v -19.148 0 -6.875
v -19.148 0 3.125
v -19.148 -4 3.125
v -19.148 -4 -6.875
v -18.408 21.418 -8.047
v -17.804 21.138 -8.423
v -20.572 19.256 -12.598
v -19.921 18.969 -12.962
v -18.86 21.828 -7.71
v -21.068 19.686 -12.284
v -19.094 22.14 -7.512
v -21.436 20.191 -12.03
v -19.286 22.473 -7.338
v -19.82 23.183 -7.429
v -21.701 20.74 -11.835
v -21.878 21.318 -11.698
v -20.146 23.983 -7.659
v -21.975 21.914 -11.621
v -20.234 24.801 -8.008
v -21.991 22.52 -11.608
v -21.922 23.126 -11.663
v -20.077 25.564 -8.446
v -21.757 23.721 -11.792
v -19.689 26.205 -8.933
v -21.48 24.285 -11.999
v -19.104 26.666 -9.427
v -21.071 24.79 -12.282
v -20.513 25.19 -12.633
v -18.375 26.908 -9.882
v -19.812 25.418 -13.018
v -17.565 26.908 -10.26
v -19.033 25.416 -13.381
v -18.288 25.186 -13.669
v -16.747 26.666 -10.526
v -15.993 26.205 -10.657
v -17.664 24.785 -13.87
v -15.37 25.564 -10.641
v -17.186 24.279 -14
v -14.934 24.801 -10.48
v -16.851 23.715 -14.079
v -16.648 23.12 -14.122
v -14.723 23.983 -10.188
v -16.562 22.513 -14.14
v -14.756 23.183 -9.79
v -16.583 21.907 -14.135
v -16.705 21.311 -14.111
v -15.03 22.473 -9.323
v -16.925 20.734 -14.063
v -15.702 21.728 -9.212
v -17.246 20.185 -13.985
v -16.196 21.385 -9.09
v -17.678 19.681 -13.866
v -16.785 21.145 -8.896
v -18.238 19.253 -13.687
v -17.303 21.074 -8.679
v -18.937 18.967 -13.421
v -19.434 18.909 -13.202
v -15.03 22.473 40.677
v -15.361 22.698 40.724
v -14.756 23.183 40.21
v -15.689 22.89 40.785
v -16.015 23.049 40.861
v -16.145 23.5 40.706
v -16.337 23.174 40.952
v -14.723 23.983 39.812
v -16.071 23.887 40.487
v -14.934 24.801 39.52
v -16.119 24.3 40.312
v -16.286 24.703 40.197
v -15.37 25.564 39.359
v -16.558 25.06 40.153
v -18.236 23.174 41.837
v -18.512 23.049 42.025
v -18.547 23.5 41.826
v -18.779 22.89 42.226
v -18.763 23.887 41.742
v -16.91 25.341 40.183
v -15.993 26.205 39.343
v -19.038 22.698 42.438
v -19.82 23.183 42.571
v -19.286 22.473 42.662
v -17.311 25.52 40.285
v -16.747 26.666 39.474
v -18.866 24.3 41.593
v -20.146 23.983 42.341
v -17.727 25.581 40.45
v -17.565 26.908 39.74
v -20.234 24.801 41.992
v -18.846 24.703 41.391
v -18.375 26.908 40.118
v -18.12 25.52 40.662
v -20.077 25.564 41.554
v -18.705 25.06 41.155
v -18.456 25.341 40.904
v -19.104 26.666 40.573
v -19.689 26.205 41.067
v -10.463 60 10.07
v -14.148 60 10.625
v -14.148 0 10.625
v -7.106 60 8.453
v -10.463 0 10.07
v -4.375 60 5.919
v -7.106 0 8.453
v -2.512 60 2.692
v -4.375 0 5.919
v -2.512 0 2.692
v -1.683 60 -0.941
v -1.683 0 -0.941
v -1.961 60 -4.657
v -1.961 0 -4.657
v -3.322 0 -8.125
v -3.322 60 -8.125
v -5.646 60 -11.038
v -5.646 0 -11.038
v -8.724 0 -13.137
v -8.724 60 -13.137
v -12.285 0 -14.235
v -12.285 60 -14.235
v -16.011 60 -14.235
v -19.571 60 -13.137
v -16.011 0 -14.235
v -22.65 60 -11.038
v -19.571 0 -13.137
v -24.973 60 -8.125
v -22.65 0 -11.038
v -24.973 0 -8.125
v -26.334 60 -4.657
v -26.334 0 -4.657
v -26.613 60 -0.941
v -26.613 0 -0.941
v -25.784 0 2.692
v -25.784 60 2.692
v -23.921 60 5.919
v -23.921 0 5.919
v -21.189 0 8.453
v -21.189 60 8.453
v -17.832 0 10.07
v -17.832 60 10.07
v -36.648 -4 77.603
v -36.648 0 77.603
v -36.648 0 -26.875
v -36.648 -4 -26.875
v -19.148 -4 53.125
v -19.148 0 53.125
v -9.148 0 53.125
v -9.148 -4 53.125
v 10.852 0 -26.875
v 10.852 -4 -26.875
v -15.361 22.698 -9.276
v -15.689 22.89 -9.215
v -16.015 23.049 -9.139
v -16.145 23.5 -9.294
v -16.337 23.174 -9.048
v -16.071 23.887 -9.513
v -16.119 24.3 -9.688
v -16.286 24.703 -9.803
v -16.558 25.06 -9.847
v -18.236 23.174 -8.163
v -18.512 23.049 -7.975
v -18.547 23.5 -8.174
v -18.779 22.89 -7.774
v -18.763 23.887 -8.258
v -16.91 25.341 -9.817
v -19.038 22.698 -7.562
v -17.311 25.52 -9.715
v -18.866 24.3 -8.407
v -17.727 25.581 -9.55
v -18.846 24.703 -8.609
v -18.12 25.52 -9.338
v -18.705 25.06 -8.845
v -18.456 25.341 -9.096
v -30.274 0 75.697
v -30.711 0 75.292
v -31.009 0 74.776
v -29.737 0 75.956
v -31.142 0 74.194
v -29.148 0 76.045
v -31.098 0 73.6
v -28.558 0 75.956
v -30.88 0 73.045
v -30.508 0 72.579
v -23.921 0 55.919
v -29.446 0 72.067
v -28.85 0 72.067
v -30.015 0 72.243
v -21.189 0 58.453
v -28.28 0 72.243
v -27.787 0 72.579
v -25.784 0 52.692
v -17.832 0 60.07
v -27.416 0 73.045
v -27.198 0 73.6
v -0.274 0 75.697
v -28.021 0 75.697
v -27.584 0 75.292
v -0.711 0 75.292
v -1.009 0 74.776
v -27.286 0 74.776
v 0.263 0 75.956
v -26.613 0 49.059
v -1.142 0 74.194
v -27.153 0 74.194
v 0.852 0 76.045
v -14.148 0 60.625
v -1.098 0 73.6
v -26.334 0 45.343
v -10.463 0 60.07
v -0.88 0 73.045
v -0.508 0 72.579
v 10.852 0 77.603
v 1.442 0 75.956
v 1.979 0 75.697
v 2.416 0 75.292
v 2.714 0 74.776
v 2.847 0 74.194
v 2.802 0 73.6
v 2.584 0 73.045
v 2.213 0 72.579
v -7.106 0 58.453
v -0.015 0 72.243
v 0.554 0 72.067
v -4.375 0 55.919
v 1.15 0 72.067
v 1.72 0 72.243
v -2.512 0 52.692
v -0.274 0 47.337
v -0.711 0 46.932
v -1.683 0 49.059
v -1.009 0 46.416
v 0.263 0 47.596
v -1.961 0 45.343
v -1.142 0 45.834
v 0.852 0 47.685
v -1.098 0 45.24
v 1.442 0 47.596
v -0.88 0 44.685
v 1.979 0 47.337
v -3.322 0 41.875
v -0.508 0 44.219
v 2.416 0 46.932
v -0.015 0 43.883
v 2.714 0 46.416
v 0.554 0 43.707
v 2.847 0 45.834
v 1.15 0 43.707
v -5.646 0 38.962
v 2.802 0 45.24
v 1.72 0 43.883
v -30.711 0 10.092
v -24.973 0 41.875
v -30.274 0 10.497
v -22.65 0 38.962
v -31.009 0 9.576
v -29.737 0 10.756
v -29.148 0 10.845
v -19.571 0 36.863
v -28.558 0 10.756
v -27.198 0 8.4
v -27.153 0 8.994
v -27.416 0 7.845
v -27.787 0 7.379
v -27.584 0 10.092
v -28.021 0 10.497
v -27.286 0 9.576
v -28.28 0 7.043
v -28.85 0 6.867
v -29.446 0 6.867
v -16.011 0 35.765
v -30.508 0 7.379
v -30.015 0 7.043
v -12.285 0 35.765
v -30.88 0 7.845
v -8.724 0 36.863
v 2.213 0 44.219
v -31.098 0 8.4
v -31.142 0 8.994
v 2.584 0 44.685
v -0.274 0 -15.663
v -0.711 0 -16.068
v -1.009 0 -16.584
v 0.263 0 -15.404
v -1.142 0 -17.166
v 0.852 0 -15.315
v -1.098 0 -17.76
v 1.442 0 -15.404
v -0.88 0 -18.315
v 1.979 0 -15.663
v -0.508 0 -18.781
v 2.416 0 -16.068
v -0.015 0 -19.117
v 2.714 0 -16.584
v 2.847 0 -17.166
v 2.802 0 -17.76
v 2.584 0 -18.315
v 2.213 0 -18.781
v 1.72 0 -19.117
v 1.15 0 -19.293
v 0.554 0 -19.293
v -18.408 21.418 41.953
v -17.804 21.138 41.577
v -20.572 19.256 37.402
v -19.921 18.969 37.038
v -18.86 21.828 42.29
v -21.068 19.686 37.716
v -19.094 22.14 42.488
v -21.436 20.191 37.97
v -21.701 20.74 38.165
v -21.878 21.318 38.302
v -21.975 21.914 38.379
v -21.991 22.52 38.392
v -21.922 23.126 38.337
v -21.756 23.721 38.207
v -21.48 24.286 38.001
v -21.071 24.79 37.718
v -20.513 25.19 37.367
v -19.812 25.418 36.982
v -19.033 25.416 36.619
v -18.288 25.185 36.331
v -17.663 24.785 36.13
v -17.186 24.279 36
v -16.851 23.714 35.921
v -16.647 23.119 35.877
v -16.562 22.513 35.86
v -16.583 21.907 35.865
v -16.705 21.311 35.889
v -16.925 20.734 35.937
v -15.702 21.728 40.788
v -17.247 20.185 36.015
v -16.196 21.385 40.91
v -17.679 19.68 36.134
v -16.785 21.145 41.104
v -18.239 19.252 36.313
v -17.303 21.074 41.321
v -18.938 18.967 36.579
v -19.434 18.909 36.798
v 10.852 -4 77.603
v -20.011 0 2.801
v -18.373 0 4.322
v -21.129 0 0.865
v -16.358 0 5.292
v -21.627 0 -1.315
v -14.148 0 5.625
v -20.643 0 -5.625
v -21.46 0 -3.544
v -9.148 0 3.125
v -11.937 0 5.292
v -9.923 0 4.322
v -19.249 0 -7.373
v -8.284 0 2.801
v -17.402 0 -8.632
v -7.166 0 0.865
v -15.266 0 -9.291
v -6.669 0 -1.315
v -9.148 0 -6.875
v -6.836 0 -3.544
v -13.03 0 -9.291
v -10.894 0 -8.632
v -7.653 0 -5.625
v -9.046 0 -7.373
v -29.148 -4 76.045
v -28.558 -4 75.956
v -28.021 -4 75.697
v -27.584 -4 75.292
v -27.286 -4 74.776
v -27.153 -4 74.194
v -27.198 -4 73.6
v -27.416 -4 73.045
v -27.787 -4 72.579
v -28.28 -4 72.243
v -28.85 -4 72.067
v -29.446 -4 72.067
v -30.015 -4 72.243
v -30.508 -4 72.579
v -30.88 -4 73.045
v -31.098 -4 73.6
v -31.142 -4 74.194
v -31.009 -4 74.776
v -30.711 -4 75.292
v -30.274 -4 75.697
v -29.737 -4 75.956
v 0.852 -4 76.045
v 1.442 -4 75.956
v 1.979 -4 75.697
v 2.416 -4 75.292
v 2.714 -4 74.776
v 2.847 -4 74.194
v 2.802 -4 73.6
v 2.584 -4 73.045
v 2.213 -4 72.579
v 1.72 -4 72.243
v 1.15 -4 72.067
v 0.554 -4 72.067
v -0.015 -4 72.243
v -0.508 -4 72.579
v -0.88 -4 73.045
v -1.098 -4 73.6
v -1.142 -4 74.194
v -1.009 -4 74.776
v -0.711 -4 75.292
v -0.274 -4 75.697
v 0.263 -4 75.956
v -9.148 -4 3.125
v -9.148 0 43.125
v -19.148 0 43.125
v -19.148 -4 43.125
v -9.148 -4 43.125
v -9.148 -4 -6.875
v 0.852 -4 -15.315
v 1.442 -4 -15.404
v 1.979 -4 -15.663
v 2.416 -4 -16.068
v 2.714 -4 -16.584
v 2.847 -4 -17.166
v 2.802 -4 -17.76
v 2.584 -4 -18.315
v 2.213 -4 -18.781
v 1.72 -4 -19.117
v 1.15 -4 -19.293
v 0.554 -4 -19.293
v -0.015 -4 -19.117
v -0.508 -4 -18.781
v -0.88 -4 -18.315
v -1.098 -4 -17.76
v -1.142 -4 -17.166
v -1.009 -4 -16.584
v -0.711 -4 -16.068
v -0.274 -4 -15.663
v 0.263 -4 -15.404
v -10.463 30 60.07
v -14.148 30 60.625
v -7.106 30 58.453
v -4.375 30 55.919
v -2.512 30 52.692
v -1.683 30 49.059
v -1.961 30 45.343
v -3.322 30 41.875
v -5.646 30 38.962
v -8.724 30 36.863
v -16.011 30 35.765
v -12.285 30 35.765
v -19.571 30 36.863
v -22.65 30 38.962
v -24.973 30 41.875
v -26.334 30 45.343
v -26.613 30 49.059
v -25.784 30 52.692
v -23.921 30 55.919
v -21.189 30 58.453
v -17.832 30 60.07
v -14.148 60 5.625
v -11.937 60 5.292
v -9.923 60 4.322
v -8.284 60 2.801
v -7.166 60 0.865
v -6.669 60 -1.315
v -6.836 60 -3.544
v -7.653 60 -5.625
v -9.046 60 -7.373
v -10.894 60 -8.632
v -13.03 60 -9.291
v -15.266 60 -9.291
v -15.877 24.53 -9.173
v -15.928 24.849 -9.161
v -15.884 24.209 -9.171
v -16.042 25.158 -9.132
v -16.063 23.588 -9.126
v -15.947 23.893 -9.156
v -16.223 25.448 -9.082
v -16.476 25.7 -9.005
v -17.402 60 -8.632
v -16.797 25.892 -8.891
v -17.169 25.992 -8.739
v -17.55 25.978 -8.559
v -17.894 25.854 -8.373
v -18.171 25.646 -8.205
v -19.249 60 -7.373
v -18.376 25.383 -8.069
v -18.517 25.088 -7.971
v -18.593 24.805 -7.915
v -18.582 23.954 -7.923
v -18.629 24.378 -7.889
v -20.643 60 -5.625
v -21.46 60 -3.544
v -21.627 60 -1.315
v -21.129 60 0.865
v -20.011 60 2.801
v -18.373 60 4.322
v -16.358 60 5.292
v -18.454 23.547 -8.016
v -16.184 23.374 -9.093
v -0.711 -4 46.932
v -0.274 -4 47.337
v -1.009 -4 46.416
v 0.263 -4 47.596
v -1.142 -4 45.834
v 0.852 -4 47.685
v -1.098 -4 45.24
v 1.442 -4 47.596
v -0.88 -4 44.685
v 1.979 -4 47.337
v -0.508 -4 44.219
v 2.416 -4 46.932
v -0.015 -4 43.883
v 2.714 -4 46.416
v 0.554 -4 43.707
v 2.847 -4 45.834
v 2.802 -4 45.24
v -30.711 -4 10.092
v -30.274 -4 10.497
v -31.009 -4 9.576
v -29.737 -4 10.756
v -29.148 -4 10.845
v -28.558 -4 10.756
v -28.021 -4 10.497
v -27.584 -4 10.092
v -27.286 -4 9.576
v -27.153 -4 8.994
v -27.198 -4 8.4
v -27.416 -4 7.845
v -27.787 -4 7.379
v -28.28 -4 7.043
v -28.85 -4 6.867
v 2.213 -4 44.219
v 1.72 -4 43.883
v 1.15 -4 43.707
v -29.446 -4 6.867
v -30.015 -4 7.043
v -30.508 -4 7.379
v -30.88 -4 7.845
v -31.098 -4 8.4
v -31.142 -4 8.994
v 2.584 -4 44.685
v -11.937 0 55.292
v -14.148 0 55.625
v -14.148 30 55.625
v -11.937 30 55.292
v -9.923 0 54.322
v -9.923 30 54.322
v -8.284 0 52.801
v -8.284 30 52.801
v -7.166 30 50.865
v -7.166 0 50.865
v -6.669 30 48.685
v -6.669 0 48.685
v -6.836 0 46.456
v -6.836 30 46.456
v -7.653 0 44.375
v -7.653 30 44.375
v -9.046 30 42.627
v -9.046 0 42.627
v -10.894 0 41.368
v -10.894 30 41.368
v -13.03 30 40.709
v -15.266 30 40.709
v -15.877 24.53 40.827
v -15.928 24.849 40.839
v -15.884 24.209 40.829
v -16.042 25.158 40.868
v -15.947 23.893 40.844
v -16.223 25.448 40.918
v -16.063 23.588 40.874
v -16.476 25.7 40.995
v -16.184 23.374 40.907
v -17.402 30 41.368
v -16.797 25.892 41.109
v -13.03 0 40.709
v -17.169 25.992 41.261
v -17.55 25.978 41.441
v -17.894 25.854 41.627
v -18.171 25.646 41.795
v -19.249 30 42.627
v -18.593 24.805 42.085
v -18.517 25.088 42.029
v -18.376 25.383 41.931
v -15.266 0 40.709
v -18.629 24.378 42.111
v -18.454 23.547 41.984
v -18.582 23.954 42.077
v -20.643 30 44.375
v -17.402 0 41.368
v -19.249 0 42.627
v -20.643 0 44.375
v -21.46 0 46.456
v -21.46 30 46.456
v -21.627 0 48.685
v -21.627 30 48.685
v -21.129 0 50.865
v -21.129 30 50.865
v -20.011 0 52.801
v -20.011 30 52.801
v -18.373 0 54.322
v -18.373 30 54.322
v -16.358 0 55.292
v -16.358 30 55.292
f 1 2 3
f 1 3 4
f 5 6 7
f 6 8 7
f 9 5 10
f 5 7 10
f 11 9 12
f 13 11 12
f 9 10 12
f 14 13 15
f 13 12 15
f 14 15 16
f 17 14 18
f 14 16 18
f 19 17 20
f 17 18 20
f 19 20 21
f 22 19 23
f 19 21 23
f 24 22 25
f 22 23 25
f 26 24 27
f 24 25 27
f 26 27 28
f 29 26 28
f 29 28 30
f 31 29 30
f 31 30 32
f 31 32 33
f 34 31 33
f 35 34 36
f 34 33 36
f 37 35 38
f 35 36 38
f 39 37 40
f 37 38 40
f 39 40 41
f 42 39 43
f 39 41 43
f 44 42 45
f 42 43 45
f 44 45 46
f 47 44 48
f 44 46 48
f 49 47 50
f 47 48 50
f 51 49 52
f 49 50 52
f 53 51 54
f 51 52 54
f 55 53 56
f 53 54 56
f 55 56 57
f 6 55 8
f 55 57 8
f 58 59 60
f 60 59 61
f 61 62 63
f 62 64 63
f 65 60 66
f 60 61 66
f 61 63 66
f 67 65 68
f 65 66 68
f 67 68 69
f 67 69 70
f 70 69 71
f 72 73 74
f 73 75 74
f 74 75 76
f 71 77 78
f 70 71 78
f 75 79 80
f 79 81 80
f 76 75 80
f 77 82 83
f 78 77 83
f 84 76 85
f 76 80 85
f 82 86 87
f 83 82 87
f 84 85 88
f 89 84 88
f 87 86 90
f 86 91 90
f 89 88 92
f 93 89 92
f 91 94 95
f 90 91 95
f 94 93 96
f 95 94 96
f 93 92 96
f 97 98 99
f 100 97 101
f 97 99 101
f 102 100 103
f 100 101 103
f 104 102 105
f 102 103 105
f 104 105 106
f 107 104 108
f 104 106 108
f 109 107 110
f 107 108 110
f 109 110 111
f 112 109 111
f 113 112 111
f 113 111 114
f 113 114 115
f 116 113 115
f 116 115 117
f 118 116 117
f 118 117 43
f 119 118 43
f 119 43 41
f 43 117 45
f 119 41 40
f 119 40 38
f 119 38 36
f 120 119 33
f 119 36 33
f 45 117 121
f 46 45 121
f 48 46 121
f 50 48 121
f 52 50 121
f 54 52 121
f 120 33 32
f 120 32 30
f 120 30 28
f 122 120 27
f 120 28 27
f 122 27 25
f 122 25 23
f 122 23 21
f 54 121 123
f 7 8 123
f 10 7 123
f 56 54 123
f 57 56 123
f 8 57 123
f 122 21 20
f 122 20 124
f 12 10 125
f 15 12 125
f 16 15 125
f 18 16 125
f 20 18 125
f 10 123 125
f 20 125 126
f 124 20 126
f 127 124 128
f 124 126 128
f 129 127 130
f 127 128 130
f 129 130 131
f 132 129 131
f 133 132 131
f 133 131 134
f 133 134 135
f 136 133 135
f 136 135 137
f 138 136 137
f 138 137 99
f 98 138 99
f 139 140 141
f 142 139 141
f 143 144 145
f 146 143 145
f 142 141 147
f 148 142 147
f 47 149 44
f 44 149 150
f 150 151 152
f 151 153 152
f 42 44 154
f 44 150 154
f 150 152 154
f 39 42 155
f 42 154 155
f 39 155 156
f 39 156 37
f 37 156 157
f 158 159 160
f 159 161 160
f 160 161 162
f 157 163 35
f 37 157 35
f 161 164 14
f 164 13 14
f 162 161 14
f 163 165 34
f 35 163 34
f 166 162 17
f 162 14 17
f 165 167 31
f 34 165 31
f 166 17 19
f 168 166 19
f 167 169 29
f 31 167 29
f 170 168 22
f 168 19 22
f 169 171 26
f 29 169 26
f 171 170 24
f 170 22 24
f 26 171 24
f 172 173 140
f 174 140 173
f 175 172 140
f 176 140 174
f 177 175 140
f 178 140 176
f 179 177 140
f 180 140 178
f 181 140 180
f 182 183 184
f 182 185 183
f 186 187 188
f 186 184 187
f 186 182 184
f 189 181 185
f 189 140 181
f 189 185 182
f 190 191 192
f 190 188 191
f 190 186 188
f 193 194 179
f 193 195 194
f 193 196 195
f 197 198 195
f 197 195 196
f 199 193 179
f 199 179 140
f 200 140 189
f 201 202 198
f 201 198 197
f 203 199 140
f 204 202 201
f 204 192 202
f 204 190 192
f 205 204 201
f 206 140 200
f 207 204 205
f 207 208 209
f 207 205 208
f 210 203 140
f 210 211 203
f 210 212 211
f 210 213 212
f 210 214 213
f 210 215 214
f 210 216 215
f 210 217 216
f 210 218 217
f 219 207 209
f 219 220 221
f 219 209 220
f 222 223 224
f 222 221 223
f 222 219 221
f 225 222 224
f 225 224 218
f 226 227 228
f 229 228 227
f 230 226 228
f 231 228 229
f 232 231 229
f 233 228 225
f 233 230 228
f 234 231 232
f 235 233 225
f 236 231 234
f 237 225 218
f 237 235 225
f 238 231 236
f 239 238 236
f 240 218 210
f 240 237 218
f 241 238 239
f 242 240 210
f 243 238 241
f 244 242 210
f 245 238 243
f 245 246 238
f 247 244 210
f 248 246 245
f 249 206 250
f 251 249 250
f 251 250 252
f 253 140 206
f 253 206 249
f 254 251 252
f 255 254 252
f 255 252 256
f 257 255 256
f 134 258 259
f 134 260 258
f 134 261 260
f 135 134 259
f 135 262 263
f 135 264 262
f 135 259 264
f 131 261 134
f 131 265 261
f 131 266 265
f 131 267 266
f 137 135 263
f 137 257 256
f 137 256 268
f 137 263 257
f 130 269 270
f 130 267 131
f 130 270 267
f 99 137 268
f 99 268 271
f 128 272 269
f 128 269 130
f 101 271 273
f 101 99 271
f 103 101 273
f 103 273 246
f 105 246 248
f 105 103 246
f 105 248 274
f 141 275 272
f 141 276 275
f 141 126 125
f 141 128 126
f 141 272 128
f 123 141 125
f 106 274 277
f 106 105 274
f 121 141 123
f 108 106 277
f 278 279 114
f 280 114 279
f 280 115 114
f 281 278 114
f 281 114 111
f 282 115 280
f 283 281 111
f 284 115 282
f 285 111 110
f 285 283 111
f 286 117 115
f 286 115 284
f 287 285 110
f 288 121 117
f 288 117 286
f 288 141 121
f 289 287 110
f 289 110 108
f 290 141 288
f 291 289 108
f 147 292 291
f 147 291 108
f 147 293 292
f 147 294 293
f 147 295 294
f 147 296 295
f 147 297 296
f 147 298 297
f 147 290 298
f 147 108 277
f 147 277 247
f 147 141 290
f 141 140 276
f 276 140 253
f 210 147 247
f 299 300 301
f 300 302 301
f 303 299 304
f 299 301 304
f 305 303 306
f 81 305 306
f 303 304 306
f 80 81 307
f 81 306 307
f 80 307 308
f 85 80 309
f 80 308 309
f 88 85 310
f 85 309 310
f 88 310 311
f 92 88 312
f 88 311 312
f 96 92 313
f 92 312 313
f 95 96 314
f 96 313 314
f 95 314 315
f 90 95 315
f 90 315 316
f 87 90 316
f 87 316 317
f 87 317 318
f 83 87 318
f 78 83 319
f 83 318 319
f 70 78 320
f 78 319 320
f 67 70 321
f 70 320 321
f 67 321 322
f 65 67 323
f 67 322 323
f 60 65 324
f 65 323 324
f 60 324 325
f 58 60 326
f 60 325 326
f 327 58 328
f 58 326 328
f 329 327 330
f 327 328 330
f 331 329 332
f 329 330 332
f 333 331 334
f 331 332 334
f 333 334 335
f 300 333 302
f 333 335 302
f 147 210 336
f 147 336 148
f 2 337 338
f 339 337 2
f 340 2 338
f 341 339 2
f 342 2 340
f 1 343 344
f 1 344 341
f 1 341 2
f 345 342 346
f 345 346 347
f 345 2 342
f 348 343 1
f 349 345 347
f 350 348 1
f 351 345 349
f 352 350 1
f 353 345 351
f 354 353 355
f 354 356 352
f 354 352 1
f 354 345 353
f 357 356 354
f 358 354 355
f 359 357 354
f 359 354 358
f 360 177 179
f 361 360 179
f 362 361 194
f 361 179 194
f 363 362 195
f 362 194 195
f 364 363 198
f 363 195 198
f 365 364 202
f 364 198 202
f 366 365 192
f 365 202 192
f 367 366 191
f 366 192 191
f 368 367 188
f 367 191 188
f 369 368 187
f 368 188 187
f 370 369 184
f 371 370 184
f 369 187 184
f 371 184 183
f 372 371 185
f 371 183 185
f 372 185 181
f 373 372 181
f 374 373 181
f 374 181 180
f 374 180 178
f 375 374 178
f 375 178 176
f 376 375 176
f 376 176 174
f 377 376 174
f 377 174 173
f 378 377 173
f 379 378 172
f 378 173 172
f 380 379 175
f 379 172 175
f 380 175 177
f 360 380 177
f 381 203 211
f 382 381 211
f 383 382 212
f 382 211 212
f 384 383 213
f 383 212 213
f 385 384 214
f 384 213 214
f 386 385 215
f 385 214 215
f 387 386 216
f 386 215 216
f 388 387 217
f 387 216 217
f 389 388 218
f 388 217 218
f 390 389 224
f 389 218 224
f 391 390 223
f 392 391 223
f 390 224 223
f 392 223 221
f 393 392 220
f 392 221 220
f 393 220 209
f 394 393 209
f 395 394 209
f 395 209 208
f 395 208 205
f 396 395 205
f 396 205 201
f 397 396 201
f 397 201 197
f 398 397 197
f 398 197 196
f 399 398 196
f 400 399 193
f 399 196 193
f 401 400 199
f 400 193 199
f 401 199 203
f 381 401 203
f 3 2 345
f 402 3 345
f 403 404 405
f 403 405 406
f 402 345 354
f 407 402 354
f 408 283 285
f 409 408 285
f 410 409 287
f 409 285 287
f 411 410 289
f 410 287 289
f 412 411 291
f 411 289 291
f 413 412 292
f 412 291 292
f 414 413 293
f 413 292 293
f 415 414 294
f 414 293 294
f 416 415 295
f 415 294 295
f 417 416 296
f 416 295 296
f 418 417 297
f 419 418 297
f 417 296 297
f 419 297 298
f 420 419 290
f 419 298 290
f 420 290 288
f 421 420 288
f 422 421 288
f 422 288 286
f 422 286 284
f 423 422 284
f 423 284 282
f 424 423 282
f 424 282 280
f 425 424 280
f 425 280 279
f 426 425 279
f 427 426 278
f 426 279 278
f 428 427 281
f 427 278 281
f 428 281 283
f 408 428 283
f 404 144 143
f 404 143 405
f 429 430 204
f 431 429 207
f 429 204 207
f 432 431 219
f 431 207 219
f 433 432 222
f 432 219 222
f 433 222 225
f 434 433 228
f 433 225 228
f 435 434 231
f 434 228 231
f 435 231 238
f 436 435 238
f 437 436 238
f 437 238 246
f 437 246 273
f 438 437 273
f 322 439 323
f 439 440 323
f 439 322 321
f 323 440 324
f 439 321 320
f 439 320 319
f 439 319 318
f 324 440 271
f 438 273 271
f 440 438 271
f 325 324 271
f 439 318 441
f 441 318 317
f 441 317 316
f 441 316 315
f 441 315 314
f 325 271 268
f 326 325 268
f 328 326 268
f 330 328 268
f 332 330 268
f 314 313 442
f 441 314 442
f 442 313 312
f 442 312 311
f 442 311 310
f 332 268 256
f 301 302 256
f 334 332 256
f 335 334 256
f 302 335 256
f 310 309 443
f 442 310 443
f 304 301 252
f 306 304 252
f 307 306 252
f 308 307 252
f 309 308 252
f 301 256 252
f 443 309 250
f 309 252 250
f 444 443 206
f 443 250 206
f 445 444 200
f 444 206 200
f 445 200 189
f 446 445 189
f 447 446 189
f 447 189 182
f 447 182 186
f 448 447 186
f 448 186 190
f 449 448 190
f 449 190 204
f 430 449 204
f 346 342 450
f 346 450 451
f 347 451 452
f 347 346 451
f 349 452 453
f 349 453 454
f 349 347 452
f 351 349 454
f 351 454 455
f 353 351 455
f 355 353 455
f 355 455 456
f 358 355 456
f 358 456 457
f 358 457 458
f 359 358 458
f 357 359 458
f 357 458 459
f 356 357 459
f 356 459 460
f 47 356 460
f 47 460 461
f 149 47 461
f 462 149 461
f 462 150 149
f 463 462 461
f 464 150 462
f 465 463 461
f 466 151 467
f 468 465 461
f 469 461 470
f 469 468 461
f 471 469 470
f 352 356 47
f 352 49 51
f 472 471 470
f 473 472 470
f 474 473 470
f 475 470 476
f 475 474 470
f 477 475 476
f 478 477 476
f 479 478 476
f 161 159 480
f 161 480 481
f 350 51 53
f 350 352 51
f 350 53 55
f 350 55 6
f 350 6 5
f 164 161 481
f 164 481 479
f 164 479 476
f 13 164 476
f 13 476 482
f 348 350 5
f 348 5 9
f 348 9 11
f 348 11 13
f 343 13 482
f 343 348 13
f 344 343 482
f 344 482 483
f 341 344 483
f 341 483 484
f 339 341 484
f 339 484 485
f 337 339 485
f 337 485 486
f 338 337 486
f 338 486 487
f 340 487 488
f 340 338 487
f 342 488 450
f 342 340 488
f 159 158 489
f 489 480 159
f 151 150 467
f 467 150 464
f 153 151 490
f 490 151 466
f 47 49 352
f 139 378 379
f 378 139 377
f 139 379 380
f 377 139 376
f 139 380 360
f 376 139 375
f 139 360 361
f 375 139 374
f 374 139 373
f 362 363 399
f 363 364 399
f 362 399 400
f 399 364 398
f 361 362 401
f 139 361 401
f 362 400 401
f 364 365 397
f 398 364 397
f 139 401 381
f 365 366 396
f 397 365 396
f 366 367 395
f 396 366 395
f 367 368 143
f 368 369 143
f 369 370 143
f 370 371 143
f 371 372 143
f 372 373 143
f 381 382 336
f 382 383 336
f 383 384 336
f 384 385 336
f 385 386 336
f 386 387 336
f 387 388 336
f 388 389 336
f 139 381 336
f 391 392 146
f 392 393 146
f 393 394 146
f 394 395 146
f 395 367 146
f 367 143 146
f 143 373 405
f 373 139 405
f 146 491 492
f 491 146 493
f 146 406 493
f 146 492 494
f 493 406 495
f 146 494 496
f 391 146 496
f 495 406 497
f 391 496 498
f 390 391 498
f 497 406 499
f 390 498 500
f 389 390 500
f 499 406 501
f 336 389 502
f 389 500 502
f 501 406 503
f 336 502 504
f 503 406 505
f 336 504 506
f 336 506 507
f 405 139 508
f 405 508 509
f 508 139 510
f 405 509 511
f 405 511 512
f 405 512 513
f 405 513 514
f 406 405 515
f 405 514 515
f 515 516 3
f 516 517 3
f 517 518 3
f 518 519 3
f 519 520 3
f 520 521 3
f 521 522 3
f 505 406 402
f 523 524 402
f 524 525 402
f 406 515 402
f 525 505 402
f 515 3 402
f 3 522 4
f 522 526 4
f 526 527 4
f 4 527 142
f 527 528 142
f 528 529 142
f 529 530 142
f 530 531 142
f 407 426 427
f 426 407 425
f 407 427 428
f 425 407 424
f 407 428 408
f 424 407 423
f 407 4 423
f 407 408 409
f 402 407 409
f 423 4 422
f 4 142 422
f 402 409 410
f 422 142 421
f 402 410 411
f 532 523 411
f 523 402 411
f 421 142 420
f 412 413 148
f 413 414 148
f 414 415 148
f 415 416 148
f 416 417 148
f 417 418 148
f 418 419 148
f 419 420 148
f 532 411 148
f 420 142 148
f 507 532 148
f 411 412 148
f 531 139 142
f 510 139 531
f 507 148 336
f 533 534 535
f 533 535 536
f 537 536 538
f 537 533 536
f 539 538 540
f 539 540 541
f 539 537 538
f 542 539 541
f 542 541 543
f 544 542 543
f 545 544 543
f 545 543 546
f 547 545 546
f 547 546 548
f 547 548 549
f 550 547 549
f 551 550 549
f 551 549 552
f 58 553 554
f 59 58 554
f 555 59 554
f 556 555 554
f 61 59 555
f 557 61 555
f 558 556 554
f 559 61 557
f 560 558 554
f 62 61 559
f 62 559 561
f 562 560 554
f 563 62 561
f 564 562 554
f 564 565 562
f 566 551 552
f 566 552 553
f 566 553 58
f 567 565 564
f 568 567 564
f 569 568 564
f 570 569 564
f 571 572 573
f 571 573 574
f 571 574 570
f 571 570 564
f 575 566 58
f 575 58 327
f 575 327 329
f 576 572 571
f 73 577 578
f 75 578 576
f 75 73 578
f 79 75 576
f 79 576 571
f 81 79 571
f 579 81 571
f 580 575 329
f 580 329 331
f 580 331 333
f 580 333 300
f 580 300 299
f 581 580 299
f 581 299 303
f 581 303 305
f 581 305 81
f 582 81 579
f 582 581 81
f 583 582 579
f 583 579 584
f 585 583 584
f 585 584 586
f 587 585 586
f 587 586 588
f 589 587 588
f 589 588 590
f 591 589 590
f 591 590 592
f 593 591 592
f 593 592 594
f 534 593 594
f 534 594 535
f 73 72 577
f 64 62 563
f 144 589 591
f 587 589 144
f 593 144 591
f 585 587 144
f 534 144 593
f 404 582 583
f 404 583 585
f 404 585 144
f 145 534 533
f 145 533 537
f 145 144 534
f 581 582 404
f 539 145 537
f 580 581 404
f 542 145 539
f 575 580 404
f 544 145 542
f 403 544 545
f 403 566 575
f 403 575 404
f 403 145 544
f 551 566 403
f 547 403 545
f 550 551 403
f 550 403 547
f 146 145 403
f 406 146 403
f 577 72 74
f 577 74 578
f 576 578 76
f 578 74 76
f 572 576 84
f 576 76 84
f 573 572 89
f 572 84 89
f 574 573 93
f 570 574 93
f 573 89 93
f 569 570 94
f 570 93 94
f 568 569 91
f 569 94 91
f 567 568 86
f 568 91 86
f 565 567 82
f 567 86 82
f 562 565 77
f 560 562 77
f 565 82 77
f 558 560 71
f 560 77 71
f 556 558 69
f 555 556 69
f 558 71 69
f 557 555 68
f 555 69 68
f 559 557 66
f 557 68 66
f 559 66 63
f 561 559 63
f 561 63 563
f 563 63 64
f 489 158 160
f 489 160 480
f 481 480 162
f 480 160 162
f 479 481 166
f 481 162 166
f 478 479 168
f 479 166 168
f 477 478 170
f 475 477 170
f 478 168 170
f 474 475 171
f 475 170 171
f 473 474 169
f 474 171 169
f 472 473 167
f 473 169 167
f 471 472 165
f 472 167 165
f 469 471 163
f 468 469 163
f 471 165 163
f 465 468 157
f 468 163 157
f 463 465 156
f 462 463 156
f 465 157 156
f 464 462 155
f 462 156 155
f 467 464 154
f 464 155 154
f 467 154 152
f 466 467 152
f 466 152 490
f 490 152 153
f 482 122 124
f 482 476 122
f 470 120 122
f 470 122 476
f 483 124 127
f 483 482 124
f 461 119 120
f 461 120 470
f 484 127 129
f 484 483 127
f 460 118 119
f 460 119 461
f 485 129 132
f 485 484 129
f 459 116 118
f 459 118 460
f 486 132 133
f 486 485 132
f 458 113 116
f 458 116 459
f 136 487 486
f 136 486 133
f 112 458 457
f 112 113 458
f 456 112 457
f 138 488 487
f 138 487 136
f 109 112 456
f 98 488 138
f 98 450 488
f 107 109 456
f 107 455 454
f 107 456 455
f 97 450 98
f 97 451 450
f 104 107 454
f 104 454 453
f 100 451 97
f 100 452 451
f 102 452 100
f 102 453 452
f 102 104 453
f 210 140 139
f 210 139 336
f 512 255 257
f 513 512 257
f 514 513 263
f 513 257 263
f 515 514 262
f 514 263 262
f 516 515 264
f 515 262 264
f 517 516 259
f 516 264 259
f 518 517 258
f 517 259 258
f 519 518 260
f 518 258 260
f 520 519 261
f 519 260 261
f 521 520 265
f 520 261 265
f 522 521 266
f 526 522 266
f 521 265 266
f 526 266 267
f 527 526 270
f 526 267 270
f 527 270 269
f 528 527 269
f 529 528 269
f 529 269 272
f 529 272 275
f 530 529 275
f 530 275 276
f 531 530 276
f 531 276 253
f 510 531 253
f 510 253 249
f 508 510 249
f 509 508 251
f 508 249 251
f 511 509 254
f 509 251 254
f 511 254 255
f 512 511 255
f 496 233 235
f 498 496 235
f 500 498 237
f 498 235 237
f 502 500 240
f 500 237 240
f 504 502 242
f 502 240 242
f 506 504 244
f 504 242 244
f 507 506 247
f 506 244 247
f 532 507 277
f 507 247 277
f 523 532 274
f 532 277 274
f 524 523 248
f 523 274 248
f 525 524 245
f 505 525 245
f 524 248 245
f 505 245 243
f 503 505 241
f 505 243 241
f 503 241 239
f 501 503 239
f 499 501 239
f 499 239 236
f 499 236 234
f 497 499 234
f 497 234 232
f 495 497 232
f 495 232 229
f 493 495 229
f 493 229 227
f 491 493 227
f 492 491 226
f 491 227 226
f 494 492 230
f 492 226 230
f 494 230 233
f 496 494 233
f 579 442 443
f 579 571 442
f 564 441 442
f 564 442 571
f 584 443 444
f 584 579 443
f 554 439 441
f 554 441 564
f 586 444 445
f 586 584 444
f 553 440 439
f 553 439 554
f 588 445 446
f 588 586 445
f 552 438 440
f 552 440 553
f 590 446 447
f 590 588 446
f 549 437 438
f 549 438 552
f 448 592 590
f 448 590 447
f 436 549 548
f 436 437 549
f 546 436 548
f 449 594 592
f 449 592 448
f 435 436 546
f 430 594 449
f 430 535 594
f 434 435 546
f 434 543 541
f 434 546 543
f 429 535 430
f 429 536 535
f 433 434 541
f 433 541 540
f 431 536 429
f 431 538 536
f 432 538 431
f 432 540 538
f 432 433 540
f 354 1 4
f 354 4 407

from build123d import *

# Parameters (mm, degrees)
SKETCH1_W                  = 47.5
SKETCH1_H                  = 110
SKETCH1_R                  = 2
SKETCH1_W_2                = 10
SKETCH1_H_2                = 10
BOSS_EXTRUDE1_DEPTH        = 4
SKETCH2_R                  = 12.5
SKETCH2_R_2                = 7.5
BOSS_EXTRUDE2_DEPTH        = 30
SKETCH4_R                  = 12.5
SKETCH4_R_2                = 7.5
BOSS_EXTRUDE3_DEPTH        = 60
SZKIC1_W                   = 47.5
SZKIC1_H                   = 5.522276491
WYTNIJ_WYCI_GNI_CIE1_DEPTH = 10.5
SZYK_LINIOWY1_COUNT        = 2
SZYK_LINIOWY1_PITCH        = 50


with BuildPart() as part:
    # Sketch1 → Boss-Extrude1 (new body)
    with BuildSketch(Plane(origin=(0, 0, 0), x_dir=(1, 0, 0), z_dir=(0, 1, 0))):
        with Locations((-12.897727273, -28.125)):
            Rectangle(SKETCH1_W, SKETCH1_H)
        with Locations(Location((0.852272727, 17.315, 0), (0, 0, 270))):
            Circle(SKETCH1_R, mode=Mode.SUBTRACT)
        with Locations(Location((-29.147727273, -8.845, 0), (0, 0, 270))):
            Circle(SKETCH1_R, mode=Mode.SUBTRACT)
        with Locations(Location((0.852272727, -45.685, 0), (0, 0, 270))):
            Circle(SKETCH1_R, mode=Mode.SUBTRACT)
        with Locations(Location((0.852272727, -74.045, 0), (0, 0, 270))):
            Circle(SKETCH1_R, mode=Mode.SUBTRACT)
        with Locations(Location((-29.147727273, -74.045, 0), (0, 0, 270))):
            Circle(SKETCH1_R, mode=Mode.SUBTRACT)
        with Locations((-14.147727273, 1.875)):
            Rectangle(SKETCH1_W_2, SKETCH1_H_2, mode=Mode.SUBTRACT)
        with Locations((-14.147727273, -48.125)):
            Rectangle(SKETCH1_W_2, SKETCH1_H_2, mode=Mode.SUBTRACT)
    extrude(amount=-BOSS_EXTRUDE1_DEPTH)

    # Sketch2 → Boss-Extrude2 (add)
    with BuildSketch(Plane(origin=(0, 0, 0), x_dir=(1, 0, 0), z_dir=(0, 1, 0))):
        with Locations(Location((-14.147727273, -48.125, 0), (0, 0, 270))):
            Circle(SKETCH2_R)
        with Locations(Location((-14.147727273, -48.125, 0), (0, 0, 270))):
            Circle(SKETCH2_R_2, mode=Mode.SUBTRACT)
    extrude(amount=BOSS_EXTRUDE2_DEPTH)

    # Sketch4 → Boss-Extrude3 (add)
    with BuildSketch(Plane(origin=(0, 0, 0), x_dir=(1, 0, 0), z_dir=(0, 1, 0))):
        with Locations(Location((-14.147727273, 1.875, 0), (0, 0, 270))):
            Circle(SKETCH4_R)
        with Locations(Location((-14.147727273, 1.875, 0), (0, 0, 270))):
            Circle(SKETCH4_R_2, mode=Mode.SUBTRACT)
    extrude(amount=BOSS_EXTRUDE3_DEPTH)

    # Szkic1 → Wytnij-wyciągnięcie1 (cut)
    with BuildSketch(Plane(origin=(0, 0, 0), x_dir=(1, 0, 0), z_dir=(0, 1, 0))):
        with Locations((-12.897727273, -80.363861754)):
            Rectangle(SZKIC1_W, SZKIC1_H)
    extrude(amount=-WYTNIJ_WYCI_GNI_CIE1_DEPTH, mode=Mode.SUBTRACT)

    # Szkic3 → Wycięcie-obrót1 (revolve, cut)
    with BuildSketch(Plane(origin=(-30.053799947, 0, 14.014317072), x_dir=(-0.4226182617407009, 0, -0.9063077870366493), z_dir=(0.9063077870366493, 0, -0.4226182617407009)), mode=Mode.PRIVATE) as wyci_cie_obr_t1_sk:
        Polygon((-31.038274345, 24.733727238), (-30.433976709, 26.129177698), (-29.168033578, 25.580963009), (-28.580169258, 26.938465486), (-22.156612406, 24.156754256), (-23.348774361, 21.40380132), align=None)
    wyci_cie_obr_t1 = revolve(wyci_cie_obr_t1_sk.sketch.rotate(Axis((-15.574618004, 26.129177698, 45.065022951), (-0.3878160615913765, -0.3973873185023342, -0.8316742279674645)), 190.498100282), axis=Axis((-15.574618004, 26.129177698, 45.065022951), (-0.3878160615913765, -0.3973873185023342, -0.8316742279674645)), mode=Mode.SUBTRACT)

    # Szyk liniowy1: Wycięcie-obrót1 ×2
    with Locations(*[(0, 0, -i * SZYK_LINIOWY1_PITCH) for i in range(1, SZYK_LINIOWY1_COUNT)]):
        add(wyci_cie_obr_t1, mode=Mode.SUBTRACT)


solid = part.part
